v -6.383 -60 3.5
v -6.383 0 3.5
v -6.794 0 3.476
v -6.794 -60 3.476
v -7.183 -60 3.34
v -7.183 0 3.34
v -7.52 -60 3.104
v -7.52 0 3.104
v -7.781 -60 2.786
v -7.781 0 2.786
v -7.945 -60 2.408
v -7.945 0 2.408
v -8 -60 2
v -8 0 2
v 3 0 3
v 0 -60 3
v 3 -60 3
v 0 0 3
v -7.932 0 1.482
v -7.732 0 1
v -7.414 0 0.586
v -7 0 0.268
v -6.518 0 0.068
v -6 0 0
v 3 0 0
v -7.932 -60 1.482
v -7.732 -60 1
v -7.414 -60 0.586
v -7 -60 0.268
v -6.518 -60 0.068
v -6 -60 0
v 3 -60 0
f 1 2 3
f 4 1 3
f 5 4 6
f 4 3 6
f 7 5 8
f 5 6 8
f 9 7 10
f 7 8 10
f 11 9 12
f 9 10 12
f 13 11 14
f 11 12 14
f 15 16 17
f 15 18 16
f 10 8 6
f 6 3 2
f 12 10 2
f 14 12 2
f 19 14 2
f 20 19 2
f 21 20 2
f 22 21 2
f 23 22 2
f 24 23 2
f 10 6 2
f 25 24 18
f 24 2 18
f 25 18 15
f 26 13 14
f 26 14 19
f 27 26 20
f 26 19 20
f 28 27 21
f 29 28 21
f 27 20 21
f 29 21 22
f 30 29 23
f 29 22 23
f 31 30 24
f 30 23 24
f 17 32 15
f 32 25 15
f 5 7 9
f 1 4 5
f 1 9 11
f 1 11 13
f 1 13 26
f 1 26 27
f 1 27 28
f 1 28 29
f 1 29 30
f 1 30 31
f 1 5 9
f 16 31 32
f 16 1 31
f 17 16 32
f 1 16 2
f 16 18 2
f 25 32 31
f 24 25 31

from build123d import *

# Parameters (mm, degrees)
F1_DEPTH = 60
F2_W     = 3
F2_H     = 3
F3_DEPTH = 60
F4_DEPTH = 42
F5_DEPTH = 35
F6_DEPTH = 7


with BuildPart() as f1:
    # F0 (on Front) → F1 (new body)
    with BuildSketch(Plane.XZ):
        with BuildLine():
            Line((-6, 0), (0, 0))
            Line((0, 0), (0, 3))
            Line((0, 3), (-6.3828637444, 3.5))
            ThreePointArc((-6.3828637444, 3.5), (-7.5200895217, 3.1043228005), (-8, 2))
            ThreePointArc((-8, 2), (-7.4142135624, 0.5857864376), (-6, 0))
        make_face()
    extrude(amount=F1_DEPTH)

    # F2 (on face) → F3 (join)
    with BuildSketch(Plane.XZ.offset(60)):
        with Locations((1.5, 1.5)):
            Rectangle(F2_W, F2_H)
    extrude(amount=-F3_DEPTH)

    # F4 (cut): a face of the model
    f4_faces = [f1.faces().sort_by_distance(p)[0] for p in [
        (-2.4940313384, -60, 1.6228930979),
    ]]
    extrude(f4_faces, amount=-F4_DEPTH, mode=Mode.SUBTRACT)

    # F5 (add): a face of the model
    f5_faces = [f1.faces().sort_by_distance(p)[0] for p in [
        (-2.4940313384, -18, 1.6228930979),
    ]]
    extrude(f5_faces, amount=F5_DEPTH)

    # F6 (add): a face of the model
    f6_faces = [f1.faces().sort_by_distance(p)[0] for p in [
        (-2.4940313384, -53, 1.6228930979),
    ]]
    extrude(f6_faces, amount=F6_DEPTH)


solid = f1.part
